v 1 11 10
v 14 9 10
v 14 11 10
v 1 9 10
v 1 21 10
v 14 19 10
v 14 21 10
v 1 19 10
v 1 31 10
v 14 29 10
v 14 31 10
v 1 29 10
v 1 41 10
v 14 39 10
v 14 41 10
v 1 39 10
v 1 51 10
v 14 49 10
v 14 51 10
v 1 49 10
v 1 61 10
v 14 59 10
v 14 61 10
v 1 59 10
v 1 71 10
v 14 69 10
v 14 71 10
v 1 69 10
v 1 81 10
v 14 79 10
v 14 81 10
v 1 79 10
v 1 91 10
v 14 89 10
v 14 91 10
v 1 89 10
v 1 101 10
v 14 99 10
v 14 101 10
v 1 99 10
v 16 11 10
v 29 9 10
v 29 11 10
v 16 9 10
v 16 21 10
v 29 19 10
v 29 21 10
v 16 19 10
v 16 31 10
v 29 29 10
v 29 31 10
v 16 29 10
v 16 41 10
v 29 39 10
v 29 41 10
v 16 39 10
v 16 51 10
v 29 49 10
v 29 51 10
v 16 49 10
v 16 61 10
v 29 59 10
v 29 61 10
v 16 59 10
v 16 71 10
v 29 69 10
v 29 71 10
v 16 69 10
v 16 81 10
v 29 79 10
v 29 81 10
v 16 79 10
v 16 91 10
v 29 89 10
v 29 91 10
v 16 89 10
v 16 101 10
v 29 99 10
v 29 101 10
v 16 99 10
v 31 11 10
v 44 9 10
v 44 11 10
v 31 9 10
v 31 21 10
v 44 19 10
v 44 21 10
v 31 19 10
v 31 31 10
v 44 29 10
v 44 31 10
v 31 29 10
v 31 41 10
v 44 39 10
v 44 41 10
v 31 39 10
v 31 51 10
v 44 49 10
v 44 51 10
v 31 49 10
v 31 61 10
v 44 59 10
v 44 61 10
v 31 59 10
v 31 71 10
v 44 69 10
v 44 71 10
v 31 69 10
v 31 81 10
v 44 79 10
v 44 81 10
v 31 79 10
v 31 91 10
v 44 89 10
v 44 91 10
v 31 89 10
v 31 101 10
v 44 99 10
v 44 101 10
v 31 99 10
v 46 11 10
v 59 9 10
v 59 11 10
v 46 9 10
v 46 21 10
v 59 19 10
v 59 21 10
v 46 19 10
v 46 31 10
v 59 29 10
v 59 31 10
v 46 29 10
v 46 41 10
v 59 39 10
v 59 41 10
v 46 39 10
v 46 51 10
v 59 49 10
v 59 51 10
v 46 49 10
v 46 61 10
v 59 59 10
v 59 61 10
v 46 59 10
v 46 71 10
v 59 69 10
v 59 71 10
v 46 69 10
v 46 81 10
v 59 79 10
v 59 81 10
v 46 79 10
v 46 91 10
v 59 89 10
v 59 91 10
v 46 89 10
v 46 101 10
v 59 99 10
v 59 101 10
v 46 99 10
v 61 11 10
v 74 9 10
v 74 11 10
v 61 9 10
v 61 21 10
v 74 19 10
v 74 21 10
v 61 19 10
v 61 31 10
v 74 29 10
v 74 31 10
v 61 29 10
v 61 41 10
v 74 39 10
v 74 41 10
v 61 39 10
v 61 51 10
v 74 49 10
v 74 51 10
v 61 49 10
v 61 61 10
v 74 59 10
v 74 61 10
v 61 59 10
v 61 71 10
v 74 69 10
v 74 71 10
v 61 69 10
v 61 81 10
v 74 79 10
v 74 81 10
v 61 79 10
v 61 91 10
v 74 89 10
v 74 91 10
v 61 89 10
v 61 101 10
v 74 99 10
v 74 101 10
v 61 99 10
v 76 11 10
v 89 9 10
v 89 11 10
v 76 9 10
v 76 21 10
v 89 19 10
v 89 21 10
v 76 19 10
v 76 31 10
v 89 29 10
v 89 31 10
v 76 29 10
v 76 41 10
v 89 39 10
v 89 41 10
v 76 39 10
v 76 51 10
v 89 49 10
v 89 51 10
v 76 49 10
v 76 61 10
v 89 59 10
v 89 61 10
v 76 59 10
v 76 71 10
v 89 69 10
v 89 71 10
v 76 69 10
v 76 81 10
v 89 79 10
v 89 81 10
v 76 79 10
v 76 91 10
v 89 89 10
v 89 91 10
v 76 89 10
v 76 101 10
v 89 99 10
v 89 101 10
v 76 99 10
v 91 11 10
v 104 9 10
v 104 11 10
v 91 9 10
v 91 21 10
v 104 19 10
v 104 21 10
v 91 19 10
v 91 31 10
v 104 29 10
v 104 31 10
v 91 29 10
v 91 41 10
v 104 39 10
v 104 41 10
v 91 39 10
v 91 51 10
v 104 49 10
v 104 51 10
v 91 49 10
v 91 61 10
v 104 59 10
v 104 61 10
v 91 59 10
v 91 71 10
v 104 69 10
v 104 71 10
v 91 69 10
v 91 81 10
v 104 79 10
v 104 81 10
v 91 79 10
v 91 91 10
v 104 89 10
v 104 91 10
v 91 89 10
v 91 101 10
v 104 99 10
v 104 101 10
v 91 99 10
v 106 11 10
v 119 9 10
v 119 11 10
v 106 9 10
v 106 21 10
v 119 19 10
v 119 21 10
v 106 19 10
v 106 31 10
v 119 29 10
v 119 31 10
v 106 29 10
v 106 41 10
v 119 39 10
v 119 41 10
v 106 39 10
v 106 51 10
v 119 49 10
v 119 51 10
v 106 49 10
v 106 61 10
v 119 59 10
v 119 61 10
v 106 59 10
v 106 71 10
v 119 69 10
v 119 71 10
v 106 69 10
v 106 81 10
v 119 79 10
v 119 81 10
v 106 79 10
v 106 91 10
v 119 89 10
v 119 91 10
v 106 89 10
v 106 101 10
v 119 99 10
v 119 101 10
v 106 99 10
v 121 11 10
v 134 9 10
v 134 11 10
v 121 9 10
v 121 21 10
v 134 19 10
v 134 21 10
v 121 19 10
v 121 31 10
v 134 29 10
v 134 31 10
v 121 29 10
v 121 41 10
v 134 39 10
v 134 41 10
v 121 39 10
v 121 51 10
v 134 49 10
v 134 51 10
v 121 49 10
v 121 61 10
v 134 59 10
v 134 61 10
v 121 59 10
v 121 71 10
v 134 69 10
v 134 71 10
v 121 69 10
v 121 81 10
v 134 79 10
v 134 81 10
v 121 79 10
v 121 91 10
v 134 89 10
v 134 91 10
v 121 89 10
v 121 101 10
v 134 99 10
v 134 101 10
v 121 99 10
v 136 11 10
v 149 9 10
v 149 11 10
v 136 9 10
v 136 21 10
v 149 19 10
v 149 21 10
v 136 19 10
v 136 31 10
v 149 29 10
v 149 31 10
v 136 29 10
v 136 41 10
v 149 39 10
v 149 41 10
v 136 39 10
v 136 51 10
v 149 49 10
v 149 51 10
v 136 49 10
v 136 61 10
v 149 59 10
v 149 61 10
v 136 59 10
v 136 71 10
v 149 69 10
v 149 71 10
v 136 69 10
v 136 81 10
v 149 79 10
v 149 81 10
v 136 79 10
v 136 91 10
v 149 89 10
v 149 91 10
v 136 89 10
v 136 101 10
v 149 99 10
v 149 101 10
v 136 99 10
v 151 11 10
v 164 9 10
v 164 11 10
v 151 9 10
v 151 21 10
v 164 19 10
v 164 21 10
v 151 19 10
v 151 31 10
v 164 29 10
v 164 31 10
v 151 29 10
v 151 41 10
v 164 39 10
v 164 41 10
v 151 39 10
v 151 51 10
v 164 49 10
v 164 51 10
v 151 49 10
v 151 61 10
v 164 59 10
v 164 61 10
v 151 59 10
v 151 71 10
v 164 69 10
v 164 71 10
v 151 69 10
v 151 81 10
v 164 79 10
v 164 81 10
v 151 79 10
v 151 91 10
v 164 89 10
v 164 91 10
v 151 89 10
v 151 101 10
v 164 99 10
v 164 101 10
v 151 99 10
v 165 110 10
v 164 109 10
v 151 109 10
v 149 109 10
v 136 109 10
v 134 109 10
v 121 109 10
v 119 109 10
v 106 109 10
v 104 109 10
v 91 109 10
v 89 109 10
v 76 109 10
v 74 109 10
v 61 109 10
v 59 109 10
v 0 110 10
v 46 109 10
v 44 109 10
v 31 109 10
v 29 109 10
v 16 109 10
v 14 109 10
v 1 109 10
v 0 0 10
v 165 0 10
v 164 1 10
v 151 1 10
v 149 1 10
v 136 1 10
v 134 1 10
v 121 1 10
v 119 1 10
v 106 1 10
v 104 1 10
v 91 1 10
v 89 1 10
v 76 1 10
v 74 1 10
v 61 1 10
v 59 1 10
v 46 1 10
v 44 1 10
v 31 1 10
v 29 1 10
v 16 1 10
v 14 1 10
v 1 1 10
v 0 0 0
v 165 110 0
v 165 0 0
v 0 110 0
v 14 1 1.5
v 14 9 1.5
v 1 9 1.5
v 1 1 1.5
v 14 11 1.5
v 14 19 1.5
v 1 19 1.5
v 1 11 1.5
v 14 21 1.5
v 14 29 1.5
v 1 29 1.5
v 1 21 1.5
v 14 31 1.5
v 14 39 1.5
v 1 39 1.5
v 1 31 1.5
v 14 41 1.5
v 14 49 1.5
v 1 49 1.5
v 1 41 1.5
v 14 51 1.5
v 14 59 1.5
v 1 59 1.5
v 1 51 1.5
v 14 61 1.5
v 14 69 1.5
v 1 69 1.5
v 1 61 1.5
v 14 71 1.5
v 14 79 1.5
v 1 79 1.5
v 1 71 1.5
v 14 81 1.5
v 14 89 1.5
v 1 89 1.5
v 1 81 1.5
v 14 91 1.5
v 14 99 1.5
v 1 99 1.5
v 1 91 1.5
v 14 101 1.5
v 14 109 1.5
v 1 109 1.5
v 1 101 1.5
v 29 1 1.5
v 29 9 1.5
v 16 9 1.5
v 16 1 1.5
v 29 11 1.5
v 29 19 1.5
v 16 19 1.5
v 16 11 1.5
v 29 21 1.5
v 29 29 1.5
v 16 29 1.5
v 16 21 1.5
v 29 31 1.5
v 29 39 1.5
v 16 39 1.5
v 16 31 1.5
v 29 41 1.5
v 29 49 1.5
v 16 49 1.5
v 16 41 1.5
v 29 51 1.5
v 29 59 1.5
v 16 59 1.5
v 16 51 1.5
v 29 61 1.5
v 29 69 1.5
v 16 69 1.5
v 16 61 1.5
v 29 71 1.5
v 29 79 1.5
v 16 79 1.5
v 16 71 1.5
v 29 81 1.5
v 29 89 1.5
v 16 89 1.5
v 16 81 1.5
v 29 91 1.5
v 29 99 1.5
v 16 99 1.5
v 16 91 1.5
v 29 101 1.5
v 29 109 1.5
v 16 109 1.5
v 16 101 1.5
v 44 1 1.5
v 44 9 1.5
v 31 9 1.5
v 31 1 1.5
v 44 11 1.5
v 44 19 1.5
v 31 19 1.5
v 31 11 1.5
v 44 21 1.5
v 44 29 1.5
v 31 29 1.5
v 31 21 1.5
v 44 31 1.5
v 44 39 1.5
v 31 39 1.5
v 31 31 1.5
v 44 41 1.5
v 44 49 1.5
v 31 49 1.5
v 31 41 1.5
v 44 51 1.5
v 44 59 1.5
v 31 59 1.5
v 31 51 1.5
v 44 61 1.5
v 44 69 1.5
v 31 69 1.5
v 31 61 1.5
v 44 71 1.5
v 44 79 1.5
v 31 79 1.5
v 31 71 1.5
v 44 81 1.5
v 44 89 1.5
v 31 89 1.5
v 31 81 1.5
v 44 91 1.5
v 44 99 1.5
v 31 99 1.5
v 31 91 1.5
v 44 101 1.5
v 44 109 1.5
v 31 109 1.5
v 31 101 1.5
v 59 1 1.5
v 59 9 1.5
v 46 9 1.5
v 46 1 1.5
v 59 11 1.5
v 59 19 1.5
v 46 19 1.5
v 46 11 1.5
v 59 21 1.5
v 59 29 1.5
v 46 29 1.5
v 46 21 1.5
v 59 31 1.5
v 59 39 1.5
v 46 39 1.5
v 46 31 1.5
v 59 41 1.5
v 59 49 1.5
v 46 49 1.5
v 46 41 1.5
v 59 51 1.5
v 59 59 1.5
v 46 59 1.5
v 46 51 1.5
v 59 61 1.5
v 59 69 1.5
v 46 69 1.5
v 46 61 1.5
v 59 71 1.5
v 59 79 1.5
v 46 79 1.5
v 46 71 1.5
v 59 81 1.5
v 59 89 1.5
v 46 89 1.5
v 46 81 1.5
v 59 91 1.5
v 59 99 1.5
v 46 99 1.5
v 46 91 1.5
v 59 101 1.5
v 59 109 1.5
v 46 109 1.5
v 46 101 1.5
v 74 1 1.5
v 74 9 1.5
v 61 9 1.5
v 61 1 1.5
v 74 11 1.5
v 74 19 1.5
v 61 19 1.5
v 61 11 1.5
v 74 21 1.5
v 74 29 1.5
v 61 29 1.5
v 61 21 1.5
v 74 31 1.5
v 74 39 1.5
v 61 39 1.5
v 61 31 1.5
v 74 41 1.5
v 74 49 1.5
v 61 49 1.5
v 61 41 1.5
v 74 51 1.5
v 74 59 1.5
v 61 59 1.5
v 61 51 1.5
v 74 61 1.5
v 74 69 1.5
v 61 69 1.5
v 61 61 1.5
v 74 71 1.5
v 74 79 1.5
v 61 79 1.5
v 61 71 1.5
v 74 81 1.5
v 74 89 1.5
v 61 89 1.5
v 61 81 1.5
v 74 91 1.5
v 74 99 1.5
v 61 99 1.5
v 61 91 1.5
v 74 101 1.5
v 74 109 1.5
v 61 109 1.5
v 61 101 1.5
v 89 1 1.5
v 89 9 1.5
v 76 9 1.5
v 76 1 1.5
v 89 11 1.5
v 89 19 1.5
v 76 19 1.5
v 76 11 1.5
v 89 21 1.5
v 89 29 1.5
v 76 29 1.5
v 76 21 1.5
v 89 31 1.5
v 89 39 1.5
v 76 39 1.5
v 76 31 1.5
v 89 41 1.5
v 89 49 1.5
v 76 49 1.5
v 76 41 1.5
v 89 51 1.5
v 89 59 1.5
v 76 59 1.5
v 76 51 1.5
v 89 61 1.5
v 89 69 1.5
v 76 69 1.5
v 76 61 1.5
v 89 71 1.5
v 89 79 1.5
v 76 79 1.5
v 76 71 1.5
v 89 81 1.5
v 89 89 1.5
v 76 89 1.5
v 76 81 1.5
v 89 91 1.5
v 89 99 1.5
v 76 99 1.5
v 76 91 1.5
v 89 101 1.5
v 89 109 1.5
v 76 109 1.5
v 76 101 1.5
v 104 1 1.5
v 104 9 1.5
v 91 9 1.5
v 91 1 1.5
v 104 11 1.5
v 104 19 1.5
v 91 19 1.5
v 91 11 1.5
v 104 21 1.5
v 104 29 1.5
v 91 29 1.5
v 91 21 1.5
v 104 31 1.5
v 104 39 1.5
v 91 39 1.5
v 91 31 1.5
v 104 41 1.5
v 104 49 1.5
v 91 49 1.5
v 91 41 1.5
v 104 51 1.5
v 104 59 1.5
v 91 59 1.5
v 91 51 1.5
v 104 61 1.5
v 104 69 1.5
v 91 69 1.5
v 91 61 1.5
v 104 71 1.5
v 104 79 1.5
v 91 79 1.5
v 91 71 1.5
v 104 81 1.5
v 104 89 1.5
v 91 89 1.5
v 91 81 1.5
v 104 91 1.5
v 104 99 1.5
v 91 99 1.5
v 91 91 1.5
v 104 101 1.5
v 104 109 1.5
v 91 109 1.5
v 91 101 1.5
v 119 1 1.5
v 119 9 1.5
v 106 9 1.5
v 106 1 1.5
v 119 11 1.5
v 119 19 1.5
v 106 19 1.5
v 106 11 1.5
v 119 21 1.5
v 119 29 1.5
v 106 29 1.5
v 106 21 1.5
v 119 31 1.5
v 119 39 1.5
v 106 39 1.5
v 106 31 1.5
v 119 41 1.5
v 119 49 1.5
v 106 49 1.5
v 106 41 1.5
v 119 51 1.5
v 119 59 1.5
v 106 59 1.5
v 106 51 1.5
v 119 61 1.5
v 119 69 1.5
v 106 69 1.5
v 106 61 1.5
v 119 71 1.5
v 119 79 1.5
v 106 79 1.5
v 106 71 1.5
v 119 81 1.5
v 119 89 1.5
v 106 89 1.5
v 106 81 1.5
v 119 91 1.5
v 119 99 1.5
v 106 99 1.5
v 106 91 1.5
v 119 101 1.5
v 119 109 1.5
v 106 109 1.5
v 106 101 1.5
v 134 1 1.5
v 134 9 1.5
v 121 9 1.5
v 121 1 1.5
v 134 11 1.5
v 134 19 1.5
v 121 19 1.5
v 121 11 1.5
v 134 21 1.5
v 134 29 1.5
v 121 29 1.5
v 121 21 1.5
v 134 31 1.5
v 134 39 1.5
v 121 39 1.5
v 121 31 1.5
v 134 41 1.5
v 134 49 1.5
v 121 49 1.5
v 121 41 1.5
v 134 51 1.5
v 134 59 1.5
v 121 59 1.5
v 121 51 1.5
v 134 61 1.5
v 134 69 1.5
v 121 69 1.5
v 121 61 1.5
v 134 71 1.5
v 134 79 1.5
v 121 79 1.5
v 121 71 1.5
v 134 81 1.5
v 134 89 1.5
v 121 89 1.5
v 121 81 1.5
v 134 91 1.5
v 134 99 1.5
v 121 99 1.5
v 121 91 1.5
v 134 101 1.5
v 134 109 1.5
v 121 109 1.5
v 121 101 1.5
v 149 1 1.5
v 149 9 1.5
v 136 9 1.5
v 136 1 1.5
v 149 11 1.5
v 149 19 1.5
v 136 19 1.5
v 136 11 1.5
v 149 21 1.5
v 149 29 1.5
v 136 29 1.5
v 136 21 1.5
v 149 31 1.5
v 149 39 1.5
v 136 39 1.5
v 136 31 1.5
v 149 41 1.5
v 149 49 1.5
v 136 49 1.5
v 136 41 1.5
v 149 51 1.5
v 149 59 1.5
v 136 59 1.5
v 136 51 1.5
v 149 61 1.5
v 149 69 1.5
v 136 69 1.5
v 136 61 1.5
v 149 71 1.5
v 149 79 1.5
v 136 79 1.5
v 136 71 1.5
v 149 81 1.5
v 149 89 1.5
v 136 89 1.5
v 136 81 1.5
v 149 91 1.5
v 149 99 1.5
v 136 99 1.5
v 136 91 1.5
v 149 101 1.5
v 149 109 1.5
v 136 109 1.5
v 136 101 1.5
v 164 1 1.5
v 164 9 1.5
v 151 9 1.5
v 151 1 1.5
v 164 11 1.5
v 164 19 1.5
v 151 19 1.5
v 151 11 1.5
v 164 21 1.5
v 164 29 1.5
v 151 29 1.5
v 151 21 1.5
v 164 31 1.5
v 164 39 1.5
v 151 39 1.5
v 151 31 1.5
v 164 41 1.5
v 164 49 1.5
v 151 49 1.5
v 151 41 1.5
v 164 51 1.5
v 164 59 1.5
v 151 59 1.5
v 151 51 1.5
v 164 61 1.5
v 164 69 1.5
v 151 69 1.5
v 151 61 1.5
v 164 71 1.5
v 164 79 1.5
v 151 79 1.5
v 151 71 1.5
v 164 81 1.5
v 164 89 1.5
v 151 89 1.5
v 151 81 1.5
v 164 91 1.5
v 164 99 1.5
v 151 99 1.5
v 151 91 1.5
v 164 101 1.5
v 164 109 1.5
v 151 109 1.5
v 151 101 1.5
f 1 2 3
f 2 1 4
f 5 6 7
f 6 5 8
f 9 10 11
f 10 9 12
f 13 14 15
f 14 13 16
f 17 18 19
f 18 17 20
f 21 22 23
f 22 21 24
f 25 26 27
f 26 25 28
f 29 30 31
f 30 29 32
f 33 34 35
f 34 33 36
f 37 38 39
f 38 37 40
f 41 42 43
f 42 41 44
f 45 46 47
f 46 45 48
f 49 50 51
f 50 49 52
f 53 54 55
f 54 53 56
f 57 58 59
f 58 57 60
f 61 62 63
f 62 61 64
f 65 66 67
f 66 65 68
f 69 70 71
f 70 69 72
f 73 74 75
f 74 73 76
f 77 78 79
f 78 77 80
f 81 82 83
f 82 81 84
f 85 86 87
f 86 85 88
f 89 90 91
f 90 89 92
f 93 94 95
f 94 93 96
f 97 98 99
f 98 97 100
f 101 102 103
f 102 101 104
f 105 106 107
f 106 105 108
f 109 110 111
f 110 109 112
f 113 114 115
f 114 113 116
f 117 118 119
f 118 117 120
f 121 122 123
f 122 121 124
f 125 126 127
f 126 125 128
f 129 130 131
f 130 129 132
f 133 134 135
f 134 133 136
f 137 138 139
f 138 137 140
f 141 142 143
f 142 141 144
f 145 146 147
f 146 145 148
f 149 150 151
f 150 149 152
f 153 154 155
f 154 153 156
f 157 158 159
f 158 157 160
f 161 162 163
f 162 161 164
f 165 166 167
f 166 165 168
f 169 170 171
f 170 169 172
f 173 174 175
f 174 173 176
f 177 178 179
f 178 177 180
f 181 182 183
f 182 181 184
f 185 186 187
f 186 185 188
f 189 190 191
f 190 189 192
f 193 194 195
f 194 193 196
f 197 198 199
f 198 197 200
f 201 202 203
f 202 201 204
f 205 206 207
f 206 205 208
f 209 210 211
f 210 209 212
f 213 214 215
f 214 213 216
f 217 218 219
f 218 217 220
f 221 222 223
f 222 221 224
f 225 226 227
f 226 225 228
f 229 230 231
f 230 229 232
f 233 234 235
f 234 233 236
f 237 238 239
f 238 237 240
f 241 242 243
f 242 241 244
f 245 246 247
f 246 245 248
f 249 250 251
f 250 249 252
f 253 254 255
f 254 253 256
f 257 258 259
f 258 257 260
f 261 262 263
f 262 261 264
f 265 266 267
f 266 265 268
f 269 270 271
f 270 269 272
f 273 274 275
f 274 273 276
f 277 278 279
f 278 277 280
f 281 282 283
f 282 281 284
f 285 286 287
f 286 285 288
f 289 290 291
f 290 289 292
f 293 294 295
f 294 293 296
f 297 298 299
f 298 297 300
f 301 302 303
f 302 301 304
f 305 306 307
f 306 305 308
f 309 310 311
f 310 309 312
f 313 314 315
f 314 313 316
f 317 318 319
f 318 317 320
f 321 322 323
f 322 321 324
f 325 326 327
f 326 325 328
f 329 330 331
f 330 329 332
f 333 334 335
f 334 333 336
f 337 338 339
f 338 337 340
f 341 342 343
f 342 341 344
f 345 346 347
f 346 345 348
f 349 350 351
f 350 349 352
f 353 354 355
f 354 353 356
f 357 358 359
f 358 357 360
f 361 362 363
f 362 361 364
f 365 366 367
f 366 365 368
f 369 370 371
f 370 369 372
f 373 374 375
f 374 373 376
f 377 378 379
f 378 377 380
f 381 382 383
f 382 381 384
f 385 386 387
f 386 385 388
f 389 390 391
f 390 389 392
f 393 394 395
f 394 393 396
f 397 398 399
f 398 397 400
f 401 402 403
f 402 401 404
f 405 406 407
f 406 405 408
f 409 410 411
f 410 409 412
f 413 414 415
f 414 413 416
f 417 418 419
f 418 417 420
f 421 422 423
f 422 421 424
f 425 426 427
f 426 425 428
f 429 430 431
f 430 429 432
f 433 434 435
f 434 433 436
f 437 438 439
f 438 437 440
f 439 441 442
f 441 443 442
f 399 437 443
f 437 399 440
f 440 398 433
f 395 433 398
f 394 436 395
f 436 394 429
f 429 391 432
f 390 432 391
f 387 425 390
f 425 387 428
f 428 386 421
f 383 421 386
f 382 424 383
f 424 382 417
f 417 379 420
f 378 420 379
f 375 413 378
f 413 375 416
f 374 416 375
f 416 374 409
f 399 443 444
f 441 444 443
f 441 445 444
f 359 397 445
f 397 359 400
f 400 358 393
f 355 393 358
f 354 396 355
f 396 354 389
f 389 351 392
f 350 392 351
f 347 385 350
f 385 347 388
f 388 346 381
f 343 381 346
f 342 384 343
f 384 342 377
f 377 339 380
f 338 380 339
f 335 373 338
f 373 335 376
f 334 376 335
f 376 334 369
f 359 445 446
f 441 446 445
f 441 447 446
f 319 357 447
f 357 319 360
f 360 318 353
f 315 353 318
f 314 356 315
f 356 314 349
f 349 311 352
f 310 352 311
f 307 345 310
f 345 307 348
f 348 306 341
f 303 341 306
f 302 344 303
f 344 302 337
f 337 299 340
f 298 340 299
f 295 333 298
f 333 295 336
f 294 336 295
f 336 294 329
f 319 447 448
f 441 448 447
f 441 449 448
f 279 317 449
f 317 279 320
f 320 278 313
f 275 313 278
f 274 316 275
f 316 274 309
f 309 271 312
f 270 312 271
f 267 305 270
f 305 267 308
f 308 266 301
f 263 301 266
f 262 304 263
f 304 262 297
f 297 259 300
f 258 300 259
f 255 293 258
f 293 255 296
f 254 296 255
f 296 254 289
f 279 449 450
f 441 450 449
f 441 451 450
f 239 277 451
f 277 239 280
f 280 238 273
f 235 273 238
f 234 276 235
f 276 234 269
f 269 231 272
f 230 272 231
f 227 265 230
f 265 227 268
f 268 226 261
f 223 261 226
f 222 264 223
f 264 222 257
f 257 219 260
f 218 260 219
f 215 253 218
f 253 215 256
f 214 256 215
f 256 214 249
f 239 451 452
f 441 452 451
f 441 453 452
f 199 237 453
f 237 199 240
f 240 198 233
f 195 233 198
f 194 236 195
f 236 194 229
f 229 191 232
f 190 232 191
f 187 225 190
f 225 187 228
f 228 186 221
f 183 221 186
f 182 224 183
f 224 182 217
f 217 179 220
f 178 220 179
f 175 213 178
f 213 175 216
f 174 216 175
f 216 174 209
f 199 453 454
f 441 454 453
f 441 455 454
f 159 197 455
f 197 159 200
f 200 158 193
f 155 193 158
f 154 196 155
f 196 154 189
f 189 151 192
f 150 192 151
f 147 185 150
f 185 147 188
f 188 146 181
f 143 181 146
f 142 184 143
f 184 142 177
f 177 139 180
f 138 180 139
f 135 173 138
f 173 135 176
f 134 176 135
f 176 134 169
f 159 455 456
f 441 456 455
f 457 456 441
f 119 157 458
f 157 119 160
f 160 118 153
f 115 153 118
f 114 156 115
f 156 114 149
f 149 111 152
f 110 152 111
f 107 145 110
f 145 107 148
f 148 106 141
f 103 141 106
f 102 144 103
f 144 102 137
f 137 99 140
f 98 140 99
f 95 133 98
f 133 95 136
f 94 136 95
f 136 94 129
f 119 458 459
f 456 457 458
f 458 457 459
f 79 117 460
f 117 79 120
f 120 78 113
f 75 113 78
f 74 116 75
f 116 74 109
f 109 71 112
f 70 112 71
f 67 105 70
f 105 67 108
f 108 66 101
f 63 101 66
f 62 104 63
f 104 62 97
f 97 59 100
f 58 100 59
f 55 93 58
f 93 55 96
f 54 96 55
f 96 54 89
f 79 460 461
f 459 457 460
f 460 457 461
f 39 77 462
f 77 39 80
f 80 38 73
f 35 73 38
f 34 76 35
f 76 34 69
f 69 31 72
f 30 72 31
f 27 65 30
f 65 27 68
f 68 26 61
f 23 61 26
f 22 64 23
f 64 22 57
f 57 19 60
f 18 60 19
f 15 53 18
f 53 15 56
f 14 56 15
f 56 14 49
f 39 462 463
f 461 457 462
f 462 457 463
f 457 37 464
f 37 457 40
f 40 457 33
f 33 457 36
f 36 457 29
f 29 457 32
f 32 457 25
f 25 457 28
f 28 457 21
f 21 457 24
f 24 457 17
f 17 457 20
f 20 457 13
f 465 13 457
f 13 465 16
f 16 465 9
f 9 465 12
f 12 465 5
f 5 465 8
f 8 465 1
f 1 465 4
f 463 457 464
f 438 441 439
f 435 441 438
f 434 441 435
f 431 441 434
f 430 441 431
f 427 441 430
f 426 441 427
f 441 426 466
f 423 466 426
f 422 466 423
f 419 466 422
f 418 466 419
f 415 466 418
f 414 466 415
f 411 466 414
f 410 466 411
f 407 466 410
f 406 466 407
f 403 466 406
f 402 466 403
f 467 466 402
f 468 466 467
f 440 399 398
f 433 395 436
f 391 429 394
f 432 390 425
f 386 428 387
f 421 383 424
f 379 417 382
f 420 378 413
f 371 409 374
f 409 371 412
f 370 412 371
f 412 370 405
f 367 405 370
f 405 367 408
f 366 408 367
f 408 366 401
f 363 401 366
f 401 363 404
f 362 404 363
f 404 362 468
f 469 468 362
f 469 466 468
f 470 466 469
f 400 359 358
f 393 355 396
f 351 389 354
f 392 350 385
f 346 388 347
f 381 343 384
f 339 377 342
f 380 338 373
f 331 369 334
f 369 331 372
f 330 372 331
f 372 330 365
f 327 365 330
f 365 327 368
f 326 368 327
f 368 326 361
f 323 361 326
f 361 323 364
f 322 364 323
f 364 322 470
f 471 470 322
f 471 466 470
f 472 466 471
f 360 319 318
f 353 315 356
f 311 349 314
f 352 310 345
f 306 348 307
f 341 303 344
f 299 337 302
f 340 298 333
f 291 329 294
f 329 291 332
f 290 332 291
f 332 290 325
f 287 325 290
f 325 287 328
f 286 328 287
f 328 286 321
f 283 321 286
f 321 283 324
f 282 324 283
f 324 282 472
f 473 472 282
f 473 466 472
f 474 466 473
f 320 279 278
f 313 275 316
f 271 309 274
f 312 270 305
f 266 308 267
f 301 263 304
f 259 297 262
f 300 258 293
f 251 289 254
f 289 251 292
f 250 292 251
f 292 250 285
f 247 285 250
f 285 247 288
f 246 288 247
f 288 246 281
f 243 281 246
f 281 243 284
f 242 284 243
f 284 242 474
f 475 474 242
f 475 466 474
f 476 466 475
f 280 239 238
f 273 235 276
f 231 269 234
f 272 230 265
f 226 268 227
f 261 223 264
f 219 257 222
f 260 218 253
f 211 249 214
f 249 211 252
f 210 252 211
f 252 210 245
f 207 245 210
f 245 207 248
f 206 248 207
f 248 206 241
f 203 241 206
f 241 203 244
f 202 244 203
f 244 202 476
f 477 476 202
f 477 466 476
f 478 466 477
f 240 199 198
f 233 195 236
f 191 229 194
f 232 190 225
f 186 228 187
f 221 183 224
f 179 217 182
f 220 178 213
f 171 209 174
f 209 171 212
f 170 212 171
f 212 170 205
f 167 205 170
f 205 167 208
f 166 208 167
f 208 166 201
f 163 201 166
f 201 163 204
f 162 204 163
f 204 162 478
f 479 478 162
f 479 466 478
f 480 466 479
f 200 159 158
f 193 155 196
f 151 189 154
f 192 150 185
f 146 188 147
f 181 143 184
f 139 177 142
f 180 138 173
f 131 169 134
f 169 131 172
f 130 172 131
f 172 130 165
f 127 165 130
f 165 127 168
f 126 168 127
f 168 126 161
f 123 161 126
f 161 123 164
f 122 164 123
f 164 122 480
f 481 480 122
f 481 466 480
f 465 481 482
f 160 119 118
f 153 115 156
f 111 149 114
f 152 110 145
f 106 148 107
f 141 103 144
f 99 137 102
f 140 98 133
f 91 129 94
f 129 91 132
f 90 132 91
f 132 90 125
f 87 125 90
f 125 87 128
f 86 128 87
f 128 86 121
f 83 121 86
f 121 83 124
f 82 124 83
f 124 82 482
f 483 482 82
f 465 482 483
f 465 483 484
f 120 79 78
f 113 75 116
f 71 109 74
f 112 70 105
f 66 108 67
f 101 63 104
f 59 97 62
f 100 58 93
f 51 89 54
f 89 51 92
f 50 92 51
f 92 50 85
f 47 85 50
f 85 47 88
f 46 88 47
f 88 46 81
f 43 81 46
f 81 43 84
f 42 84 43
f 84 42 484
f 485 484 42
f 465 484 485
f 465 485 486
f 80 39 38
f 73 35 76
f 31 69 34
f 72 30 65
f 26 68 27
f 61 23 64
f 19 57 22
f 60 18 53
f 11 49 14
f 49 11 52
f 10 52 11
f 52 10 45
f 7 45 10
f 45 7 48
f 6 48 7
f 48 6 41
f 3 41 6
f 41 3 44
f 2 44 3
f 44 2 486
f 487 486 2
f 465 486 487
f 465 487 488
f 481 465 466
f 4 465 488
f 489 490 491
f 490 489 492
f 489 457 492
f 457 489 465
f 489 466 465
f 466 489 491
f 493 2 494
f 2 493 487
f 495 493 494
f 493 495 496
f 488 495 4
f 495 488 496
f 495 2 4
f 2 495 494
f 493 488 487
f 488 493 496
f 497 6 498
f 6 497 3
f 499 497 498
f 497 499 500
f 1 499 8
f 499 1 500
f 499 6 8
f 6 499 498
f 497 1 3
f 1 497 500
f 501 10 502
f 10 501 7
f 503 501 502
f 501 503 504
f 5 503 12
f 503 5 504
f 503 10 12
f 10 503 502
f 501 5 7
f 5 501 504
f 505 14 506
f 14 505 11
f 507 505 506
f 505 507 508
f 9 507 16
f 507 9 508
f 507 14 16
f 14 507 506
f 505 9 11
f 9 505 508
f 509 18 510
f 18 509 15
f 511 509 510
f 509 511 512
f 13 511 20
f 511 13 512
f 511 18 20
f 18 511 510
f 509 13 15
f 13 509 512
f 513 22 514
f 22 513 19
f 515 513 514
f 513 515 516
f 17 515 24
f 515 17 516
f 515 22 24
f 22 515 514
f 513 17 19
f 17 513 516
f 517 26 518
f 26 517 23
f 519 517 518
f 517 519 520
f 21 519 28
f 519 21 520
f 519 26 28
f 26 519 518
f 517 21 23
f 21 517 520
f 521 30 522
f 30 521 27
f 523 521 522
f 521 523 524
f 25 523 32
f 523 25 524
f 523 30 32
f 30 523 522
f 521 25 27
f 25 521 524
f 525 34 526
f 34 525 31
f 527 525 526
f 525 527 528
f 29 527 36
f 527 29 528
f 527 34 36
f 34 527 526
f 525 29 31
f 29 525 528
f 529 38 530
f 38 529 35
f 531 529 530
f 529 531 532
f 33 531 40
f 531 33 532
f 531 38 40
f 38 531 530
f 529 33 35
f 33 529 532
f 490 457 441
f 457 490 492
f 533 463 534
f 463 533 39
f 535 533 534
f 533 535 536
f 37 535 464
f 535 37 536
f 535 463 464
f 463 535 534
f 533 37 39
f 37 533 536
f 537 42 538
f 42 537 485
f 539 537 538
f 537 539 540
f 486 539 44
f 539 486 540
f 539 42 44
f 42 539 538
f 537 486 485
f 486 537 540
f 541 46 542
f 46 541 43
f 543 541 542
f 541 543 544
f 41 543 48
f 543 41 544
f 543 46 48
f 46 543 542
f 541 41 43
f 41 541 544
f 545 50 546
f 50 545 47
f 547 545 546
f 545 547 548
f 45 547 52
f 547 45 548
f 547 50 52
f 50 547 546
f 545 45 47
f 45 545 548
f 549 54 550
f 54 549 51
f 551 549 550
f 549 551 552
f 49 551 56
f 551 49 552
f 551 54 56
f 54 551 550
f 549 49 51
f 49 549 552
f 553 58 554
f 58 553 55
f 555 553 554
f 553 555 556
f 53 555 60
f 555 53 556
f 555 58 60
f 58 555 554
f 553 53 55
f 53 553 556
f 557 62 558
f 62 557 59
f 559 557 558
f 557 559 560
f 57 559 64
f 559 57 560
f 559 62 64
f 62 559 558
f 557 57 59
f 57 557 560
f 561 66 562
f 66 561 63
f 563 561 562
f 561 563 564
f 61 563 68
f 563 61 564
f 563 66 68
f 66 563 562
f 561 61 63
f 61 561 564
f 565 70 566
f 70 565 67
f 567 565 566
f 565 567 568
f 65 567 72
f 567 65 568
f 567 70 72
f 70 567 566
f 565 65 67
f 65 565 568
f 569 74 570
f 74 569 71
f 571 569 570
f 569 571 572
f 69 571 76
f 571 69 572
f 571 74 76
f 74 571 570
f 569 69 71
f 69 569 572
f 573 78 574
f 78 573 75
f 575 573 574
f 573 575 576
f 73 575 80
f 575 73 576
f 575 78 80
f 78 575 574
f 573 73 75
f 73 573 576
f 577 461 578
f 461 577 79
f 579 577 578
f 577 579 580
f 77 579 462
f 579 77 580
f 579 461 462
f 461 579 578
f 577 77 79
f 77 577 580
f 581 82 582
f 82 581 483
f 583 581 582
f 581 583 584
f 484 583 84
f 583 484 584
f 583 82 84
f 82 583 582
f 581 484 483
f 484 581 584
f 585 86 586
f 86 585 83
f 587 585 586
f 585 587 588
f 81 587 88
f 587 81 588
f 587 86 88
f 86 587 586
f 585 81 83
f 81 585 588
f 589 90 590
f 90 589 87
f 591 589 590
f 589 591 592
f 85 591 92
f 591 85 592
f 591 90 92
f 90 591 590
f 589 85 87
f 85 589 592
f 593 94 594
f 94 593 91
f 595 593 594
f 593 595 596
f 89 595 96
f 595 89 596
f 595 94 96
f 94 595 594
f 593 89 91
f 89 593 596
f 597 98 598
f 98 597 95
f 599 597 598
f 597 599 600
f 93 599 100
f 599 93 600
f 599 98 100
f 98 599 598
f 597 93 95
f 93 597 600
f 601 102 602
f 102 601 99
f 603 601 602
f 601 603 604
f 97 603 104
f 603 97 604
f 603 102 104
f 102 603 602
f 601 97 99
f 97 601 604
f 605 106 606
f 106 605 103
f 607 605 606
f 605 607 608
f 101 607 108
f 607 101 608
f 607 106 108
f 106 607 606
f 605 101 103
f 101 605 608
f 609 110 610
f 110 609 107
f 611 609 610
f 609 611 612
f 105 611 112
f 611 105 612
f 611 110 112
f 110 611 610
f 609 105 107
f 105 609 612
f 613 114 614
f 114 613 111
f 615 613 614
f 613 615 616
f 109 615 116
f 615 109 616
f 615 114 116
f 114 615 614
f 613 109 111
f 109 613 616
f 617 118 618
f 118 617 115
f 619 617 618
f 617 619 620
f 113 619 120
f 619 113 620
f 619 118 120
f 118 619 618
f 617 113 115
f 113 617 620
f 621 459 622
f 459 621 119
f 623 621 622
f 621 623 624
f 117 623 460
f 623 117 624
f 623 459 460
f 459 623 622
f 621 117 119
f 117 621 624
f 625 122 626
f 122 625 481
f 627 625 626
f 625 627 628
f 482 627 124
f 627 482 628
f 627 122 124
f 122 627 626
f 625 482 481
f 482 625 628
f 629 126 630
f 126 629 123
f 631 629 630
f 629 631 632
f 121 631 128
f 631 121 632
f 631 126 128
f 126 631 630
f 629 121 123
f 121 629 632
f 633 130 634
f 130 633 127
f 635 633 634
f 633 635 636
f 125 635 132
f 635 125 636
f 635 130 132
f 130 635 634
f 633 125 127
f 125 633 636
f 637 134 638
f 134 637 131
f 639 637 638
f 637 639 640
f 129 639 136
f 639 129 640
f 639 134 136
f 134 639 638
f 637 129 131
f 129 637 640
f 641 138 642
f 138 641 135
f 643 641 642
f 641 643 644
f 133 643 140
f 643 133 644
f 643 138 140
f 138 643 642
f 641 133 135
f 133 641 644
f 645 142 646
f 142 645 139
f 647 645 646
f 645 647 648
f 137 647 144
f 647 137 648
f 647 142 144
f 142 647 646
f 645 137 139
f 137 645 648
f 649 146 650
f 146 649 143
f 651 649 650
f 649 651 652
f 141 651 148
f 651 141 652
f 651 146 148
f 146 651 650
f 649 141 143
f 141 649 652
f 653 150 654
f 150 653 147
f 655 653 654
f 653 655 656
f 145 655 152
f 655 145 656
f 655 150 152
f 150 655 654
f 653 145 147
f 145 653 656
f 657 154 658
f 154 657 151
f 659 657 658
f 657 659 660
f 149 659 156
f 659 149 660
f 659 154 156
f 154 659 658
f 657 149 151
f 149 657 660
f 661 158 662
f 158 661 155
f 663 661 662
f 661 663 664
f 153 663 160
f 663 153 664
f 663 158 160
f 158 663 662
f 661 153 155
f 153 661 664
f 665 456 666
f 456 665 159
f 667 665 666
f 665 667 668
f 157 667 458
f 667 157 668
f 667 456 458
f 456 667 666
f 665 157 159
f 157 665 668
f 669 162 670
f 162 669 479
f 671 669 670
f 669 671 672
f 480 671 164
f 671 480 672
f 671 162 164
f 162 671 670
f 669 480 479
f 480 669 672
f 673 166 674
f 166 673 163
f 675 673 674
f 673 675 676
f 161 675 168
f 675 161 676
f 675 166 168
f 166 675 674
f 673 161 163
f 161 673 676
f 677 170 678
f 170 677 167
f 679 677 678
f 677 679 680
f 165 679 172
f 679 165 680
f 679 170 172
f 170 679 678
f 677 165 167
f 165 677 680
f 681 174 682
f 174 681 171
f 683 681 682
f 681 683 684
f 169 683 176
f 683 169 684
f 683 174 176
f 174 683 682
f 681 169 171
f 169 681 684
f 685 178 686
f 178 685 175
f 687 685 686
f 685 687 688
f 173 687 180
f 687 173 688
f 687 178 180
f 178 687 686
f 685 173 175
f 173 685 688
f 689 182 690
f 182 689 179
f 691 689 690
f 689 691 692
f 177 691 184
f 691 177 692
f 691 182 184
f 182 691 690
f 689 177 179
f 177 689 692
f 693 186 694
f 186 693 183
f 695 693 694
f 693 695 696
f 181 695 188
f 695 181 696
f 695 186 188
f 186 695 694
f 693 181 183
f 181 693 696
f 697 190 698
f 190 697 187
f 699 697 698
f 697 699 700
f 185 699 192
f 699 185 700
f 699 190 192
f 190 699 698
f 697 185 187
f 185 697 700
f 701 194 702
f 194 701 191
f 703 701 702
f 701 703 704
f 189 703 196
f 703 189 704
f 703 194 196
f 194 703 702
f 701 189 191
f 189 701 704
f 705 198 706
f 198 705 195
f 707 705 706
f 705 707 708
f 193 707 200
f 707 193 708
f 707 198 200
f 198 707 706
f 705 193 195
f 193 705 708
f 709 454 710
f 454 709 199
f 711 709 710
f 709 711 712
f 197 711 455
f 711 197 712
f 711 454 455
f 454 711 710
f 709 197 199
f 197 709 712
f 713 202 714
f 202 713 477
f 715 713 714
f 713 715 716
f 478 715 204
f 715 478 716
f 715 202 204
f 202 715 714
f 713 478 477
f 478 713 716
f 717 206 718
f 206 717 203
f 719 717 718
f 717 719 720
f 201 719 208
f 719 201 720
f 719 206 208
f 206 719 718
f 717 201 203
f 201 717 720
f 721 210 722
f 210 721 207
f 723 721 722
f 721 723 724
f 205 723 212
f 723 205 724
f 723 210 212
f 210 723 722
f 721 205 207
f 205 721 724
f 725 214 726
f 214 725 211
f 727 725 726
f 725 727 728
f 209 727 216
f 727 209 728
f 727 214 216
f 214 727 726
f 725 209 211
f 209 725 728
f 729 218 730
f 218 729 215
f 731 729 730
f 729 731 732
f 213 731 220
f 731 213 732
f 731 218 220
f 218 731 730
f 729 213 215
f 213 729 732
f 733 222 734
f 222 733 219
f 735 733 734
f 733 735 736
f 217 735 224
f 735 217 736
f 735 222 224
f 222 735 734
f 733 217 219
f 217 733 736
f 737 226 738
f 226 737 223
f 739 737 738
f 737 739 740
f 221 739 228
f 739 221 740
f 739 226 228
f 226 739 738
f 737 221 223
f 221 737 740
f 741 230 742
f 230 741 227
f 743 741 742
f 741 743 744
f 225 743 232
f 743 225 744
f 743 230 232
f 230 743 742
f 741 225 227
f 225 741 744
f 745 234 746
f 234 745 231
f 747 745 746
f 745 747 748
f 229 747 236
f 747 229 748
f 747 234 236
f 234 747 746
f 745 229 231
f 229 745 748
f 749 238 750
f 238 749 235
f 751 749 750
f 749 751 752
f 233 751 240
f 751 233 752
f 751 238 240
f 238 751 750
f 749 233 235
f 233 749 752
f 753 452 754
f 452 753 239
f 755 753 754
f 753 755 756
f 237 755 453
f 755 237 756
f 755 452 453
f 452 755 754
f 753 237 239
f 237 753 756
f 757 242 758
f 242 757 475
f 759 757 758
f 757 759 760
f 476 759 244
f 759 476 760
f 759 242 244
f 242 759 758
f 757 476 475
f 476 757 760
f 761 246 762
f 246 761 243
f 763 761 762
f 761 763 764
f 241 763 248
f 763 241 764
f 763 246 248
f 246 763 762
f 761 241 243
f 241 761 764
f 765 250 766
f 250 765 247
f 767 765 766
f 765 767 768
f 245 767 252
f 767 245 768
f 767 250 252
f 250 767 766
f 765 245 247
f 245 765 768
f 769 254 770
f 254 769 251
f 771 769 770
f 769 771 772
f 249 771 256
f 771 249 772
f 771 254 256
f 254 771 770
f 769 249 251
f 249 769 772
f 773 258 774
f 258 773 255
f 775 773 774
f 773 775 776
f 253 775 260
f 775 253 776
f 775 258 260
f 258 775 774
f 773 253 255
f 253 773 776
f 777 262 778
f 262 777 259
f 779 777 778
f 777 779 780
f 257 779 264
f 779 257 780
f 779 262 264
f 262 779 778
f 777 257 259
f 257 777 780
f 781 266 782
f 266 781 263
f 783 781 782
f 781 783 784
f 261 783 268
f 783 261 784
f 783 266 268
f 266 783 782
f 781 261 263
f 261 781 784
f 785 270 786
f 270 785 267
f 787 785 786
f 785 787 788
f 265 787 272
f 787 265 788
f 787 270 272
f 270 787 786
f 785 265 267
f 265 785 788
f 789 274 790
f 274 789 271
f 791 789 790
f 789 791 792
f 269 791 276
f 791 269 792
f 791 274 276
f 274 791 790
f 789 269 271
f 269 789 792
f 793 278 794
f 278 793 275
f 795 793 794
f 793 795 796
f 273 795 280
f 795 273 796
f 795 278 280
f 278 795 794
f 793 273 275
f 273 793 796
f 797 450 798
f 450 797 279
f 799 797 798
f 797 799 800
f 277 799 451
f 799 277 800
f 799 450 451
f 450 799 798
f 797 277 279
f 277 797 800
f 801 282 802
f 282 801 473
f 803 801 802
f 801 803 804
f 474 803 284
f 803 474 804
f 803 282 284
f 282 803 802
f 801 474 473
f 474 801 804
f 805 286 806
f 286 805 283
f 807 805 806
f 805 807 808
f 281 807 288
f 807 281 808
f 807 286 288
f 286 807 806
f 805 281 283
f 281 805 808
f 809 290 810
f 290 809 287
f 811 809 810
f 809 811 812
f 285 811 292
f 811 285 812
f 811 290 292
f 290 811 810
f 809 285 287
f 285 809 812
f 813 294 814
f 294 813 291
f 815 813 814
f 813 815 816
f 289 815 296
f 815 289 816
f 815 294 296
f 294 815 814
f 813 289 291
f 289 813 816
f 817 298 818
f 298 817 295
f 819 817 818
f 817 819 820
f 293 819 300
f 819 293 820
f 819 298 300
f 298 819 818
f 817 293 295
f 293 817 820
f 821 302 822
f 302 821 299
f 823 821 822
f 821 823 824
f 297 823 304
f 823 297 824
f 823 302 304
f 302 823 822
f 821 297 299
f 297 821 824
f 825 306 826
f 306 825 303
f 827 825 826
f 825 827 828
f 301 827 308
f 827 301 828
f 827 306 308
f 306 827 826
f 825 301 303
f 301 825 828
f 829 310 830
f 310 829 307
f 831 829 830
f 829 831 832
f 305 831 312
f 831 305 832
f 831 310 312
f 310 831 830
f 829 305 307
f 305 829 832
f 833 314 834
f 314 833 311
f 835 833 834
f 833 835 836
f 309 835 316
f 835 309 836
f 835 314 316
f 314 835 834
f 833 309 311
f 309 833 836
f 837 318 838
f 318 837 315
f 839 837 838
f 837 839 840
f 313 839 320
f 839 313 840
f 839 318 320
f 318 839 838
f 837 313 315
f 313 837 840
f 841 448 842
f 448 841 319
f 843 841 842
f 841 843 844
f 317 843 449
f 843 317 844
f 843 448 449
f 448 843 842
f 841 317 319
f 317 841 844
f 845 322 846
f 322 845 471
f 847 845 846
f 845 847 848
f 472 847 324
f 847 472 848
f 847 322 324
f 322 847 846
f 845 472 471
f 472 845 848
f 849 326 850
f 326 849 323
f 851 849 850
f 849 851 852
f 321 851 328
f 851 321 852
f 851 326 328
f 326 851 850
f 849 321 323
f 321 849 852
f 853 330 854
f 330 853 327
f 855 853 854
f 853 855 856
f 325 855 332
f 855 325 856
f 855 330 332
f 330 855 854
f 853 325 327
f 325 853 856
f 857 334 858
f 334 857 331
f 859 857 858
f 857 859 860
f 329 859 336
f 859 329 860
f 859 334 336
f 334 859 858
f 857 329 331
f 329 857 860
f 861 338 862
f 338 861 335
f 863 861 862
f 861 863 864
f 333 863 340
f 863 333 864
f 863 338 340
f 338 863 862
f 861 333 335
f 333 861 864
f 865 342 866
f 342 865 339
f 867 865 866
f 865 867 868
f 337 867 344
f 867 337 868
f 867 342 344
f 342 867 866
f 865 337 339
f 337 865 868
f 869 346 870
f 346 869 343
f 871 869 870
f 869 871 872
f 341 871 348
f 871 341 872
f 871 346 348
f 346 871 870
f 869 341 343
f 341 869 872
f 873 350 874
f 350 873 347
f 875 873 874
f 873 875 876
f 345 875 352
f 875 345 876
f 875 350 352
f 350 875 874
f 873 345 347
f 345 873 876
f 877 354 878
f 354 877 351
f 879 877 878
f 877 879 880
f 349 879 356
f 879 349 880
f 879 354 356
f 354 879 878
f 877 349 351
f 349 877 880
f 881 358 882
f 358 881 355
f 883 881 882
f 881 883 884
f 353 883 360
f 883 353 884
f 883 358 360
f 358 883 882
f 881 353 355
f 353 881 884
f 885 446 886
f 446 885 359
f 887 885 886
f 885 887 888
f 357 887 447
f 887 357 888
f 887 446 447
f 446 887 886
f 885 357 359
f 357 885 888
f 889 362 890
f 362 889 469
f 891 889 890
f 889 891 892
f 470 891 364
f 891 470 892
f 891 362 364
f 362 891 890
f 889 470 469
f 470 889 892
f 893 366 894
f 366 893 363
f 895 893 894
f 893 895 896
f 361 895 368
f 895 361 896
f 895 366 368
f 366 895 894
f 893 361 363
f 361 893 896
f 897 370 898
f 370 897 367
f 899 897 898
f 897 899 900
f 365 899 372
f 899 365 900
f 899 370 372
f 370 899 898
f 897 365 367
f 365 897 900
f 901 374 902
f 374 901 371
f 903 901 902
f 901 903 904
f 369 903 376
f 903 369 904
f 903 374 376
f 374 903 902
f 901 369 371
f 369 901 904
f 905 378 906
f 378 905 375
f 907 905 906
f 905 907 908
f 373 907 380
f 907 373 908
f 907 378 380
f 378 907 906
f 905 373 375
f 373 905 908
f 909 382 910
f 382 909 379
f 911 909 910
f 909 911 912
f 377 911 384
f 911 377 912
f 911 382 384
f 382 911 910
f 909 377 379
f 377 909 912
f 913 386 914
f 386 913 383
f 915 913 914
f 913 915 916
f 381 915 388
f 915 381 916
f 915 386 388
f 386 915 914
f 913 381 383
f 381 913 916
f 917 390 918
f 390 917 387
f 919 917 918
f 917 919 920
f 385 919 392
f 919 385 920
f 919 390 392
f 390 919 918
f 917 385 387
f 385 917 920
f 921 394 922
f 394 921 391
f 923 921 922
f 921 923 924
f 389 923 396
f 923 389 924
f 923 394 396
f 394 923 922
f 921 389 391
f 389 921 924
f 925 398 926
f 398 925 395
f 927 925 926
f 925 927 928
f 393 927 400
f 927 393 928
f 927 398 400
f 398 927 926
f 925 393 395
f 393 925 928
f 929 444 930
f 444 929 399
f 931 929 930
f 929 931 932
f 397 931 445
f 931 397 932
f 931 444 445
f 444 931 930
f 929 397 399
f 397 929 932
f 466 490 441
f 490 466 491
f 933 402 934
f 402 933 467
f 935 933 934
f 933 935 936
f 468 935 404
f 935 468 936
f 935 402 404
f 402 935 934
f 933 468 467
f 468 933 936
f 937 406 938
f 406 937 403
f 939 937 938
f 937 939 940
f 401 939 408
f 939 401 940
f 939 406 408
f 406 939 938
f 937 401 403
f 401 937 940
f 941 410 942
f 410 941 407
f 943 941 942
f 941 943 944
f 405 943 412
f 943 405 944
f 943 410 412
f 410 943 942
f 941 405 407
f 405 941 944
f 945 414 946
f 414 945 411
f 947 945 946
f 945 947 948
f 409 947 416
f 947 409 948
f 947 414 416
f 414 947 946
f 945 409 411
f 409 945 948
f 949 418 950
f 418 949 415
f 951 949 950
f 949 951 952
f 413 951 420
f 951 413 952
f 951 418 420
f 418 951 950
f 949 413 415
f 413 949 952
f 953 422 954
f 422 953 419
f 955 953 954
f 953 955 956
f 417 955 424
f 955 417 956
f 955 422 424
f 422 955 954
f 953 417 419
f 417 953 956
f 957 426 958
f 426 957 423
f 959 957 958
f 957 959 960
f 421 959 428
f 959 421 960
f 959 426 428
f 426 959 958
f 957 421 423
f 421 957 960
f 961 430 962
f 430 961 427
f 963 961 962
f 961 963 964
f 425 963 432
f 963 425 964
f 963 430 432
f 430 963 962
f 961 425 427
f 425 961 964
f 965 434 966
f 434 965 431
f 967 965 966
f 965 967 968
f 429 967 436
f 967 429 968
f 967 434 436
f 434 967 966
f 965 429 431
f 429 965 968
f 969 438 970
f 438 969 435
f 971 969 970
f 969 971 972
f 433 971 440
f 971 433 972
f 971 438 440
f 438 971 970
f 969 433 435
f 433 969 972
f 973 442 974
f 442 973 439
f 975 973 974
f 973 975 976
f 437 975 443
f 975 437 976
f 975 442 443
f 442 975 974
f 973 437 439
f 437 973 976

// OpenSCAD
//box (10, 10, 10, 0.5);

box_x = 15;
box_y = 10;
box_z = 10;
thick = 1;

for (ix = [0: 1: 10]) {
    for (iy = [0: 1: 10]) {
        translate([ix * box_x, iy * box_y, 0]) box (box_x, box_y, box_z, thick);
    }
}

module box (width, depth, height, thickness) {
    translate([width/2, depth/2, height/2]) {
        difference() {
            color ("red") cube([width, depth, height], center = true);
            translate([0, 0, thickness]) {
                color ("blue") cube([width - 2 * thickness, depth - 2 * thickness, height - thickness], center = true);
            }
        }
    }
}

module rounded_cube(x, y, h, r) {
    hull() {
        translate([r, r, 0]) cylinder(h, r, $fn=100);
        translate([x - r, y - r, 0]) cylinder(h, r, $fn=100);
        translate([r, y - r, 0]) cylinder(h, r, $fn=100);
        translate([x -r, r, 0]) cylinder(h, r, $fn=100);
    }
}
